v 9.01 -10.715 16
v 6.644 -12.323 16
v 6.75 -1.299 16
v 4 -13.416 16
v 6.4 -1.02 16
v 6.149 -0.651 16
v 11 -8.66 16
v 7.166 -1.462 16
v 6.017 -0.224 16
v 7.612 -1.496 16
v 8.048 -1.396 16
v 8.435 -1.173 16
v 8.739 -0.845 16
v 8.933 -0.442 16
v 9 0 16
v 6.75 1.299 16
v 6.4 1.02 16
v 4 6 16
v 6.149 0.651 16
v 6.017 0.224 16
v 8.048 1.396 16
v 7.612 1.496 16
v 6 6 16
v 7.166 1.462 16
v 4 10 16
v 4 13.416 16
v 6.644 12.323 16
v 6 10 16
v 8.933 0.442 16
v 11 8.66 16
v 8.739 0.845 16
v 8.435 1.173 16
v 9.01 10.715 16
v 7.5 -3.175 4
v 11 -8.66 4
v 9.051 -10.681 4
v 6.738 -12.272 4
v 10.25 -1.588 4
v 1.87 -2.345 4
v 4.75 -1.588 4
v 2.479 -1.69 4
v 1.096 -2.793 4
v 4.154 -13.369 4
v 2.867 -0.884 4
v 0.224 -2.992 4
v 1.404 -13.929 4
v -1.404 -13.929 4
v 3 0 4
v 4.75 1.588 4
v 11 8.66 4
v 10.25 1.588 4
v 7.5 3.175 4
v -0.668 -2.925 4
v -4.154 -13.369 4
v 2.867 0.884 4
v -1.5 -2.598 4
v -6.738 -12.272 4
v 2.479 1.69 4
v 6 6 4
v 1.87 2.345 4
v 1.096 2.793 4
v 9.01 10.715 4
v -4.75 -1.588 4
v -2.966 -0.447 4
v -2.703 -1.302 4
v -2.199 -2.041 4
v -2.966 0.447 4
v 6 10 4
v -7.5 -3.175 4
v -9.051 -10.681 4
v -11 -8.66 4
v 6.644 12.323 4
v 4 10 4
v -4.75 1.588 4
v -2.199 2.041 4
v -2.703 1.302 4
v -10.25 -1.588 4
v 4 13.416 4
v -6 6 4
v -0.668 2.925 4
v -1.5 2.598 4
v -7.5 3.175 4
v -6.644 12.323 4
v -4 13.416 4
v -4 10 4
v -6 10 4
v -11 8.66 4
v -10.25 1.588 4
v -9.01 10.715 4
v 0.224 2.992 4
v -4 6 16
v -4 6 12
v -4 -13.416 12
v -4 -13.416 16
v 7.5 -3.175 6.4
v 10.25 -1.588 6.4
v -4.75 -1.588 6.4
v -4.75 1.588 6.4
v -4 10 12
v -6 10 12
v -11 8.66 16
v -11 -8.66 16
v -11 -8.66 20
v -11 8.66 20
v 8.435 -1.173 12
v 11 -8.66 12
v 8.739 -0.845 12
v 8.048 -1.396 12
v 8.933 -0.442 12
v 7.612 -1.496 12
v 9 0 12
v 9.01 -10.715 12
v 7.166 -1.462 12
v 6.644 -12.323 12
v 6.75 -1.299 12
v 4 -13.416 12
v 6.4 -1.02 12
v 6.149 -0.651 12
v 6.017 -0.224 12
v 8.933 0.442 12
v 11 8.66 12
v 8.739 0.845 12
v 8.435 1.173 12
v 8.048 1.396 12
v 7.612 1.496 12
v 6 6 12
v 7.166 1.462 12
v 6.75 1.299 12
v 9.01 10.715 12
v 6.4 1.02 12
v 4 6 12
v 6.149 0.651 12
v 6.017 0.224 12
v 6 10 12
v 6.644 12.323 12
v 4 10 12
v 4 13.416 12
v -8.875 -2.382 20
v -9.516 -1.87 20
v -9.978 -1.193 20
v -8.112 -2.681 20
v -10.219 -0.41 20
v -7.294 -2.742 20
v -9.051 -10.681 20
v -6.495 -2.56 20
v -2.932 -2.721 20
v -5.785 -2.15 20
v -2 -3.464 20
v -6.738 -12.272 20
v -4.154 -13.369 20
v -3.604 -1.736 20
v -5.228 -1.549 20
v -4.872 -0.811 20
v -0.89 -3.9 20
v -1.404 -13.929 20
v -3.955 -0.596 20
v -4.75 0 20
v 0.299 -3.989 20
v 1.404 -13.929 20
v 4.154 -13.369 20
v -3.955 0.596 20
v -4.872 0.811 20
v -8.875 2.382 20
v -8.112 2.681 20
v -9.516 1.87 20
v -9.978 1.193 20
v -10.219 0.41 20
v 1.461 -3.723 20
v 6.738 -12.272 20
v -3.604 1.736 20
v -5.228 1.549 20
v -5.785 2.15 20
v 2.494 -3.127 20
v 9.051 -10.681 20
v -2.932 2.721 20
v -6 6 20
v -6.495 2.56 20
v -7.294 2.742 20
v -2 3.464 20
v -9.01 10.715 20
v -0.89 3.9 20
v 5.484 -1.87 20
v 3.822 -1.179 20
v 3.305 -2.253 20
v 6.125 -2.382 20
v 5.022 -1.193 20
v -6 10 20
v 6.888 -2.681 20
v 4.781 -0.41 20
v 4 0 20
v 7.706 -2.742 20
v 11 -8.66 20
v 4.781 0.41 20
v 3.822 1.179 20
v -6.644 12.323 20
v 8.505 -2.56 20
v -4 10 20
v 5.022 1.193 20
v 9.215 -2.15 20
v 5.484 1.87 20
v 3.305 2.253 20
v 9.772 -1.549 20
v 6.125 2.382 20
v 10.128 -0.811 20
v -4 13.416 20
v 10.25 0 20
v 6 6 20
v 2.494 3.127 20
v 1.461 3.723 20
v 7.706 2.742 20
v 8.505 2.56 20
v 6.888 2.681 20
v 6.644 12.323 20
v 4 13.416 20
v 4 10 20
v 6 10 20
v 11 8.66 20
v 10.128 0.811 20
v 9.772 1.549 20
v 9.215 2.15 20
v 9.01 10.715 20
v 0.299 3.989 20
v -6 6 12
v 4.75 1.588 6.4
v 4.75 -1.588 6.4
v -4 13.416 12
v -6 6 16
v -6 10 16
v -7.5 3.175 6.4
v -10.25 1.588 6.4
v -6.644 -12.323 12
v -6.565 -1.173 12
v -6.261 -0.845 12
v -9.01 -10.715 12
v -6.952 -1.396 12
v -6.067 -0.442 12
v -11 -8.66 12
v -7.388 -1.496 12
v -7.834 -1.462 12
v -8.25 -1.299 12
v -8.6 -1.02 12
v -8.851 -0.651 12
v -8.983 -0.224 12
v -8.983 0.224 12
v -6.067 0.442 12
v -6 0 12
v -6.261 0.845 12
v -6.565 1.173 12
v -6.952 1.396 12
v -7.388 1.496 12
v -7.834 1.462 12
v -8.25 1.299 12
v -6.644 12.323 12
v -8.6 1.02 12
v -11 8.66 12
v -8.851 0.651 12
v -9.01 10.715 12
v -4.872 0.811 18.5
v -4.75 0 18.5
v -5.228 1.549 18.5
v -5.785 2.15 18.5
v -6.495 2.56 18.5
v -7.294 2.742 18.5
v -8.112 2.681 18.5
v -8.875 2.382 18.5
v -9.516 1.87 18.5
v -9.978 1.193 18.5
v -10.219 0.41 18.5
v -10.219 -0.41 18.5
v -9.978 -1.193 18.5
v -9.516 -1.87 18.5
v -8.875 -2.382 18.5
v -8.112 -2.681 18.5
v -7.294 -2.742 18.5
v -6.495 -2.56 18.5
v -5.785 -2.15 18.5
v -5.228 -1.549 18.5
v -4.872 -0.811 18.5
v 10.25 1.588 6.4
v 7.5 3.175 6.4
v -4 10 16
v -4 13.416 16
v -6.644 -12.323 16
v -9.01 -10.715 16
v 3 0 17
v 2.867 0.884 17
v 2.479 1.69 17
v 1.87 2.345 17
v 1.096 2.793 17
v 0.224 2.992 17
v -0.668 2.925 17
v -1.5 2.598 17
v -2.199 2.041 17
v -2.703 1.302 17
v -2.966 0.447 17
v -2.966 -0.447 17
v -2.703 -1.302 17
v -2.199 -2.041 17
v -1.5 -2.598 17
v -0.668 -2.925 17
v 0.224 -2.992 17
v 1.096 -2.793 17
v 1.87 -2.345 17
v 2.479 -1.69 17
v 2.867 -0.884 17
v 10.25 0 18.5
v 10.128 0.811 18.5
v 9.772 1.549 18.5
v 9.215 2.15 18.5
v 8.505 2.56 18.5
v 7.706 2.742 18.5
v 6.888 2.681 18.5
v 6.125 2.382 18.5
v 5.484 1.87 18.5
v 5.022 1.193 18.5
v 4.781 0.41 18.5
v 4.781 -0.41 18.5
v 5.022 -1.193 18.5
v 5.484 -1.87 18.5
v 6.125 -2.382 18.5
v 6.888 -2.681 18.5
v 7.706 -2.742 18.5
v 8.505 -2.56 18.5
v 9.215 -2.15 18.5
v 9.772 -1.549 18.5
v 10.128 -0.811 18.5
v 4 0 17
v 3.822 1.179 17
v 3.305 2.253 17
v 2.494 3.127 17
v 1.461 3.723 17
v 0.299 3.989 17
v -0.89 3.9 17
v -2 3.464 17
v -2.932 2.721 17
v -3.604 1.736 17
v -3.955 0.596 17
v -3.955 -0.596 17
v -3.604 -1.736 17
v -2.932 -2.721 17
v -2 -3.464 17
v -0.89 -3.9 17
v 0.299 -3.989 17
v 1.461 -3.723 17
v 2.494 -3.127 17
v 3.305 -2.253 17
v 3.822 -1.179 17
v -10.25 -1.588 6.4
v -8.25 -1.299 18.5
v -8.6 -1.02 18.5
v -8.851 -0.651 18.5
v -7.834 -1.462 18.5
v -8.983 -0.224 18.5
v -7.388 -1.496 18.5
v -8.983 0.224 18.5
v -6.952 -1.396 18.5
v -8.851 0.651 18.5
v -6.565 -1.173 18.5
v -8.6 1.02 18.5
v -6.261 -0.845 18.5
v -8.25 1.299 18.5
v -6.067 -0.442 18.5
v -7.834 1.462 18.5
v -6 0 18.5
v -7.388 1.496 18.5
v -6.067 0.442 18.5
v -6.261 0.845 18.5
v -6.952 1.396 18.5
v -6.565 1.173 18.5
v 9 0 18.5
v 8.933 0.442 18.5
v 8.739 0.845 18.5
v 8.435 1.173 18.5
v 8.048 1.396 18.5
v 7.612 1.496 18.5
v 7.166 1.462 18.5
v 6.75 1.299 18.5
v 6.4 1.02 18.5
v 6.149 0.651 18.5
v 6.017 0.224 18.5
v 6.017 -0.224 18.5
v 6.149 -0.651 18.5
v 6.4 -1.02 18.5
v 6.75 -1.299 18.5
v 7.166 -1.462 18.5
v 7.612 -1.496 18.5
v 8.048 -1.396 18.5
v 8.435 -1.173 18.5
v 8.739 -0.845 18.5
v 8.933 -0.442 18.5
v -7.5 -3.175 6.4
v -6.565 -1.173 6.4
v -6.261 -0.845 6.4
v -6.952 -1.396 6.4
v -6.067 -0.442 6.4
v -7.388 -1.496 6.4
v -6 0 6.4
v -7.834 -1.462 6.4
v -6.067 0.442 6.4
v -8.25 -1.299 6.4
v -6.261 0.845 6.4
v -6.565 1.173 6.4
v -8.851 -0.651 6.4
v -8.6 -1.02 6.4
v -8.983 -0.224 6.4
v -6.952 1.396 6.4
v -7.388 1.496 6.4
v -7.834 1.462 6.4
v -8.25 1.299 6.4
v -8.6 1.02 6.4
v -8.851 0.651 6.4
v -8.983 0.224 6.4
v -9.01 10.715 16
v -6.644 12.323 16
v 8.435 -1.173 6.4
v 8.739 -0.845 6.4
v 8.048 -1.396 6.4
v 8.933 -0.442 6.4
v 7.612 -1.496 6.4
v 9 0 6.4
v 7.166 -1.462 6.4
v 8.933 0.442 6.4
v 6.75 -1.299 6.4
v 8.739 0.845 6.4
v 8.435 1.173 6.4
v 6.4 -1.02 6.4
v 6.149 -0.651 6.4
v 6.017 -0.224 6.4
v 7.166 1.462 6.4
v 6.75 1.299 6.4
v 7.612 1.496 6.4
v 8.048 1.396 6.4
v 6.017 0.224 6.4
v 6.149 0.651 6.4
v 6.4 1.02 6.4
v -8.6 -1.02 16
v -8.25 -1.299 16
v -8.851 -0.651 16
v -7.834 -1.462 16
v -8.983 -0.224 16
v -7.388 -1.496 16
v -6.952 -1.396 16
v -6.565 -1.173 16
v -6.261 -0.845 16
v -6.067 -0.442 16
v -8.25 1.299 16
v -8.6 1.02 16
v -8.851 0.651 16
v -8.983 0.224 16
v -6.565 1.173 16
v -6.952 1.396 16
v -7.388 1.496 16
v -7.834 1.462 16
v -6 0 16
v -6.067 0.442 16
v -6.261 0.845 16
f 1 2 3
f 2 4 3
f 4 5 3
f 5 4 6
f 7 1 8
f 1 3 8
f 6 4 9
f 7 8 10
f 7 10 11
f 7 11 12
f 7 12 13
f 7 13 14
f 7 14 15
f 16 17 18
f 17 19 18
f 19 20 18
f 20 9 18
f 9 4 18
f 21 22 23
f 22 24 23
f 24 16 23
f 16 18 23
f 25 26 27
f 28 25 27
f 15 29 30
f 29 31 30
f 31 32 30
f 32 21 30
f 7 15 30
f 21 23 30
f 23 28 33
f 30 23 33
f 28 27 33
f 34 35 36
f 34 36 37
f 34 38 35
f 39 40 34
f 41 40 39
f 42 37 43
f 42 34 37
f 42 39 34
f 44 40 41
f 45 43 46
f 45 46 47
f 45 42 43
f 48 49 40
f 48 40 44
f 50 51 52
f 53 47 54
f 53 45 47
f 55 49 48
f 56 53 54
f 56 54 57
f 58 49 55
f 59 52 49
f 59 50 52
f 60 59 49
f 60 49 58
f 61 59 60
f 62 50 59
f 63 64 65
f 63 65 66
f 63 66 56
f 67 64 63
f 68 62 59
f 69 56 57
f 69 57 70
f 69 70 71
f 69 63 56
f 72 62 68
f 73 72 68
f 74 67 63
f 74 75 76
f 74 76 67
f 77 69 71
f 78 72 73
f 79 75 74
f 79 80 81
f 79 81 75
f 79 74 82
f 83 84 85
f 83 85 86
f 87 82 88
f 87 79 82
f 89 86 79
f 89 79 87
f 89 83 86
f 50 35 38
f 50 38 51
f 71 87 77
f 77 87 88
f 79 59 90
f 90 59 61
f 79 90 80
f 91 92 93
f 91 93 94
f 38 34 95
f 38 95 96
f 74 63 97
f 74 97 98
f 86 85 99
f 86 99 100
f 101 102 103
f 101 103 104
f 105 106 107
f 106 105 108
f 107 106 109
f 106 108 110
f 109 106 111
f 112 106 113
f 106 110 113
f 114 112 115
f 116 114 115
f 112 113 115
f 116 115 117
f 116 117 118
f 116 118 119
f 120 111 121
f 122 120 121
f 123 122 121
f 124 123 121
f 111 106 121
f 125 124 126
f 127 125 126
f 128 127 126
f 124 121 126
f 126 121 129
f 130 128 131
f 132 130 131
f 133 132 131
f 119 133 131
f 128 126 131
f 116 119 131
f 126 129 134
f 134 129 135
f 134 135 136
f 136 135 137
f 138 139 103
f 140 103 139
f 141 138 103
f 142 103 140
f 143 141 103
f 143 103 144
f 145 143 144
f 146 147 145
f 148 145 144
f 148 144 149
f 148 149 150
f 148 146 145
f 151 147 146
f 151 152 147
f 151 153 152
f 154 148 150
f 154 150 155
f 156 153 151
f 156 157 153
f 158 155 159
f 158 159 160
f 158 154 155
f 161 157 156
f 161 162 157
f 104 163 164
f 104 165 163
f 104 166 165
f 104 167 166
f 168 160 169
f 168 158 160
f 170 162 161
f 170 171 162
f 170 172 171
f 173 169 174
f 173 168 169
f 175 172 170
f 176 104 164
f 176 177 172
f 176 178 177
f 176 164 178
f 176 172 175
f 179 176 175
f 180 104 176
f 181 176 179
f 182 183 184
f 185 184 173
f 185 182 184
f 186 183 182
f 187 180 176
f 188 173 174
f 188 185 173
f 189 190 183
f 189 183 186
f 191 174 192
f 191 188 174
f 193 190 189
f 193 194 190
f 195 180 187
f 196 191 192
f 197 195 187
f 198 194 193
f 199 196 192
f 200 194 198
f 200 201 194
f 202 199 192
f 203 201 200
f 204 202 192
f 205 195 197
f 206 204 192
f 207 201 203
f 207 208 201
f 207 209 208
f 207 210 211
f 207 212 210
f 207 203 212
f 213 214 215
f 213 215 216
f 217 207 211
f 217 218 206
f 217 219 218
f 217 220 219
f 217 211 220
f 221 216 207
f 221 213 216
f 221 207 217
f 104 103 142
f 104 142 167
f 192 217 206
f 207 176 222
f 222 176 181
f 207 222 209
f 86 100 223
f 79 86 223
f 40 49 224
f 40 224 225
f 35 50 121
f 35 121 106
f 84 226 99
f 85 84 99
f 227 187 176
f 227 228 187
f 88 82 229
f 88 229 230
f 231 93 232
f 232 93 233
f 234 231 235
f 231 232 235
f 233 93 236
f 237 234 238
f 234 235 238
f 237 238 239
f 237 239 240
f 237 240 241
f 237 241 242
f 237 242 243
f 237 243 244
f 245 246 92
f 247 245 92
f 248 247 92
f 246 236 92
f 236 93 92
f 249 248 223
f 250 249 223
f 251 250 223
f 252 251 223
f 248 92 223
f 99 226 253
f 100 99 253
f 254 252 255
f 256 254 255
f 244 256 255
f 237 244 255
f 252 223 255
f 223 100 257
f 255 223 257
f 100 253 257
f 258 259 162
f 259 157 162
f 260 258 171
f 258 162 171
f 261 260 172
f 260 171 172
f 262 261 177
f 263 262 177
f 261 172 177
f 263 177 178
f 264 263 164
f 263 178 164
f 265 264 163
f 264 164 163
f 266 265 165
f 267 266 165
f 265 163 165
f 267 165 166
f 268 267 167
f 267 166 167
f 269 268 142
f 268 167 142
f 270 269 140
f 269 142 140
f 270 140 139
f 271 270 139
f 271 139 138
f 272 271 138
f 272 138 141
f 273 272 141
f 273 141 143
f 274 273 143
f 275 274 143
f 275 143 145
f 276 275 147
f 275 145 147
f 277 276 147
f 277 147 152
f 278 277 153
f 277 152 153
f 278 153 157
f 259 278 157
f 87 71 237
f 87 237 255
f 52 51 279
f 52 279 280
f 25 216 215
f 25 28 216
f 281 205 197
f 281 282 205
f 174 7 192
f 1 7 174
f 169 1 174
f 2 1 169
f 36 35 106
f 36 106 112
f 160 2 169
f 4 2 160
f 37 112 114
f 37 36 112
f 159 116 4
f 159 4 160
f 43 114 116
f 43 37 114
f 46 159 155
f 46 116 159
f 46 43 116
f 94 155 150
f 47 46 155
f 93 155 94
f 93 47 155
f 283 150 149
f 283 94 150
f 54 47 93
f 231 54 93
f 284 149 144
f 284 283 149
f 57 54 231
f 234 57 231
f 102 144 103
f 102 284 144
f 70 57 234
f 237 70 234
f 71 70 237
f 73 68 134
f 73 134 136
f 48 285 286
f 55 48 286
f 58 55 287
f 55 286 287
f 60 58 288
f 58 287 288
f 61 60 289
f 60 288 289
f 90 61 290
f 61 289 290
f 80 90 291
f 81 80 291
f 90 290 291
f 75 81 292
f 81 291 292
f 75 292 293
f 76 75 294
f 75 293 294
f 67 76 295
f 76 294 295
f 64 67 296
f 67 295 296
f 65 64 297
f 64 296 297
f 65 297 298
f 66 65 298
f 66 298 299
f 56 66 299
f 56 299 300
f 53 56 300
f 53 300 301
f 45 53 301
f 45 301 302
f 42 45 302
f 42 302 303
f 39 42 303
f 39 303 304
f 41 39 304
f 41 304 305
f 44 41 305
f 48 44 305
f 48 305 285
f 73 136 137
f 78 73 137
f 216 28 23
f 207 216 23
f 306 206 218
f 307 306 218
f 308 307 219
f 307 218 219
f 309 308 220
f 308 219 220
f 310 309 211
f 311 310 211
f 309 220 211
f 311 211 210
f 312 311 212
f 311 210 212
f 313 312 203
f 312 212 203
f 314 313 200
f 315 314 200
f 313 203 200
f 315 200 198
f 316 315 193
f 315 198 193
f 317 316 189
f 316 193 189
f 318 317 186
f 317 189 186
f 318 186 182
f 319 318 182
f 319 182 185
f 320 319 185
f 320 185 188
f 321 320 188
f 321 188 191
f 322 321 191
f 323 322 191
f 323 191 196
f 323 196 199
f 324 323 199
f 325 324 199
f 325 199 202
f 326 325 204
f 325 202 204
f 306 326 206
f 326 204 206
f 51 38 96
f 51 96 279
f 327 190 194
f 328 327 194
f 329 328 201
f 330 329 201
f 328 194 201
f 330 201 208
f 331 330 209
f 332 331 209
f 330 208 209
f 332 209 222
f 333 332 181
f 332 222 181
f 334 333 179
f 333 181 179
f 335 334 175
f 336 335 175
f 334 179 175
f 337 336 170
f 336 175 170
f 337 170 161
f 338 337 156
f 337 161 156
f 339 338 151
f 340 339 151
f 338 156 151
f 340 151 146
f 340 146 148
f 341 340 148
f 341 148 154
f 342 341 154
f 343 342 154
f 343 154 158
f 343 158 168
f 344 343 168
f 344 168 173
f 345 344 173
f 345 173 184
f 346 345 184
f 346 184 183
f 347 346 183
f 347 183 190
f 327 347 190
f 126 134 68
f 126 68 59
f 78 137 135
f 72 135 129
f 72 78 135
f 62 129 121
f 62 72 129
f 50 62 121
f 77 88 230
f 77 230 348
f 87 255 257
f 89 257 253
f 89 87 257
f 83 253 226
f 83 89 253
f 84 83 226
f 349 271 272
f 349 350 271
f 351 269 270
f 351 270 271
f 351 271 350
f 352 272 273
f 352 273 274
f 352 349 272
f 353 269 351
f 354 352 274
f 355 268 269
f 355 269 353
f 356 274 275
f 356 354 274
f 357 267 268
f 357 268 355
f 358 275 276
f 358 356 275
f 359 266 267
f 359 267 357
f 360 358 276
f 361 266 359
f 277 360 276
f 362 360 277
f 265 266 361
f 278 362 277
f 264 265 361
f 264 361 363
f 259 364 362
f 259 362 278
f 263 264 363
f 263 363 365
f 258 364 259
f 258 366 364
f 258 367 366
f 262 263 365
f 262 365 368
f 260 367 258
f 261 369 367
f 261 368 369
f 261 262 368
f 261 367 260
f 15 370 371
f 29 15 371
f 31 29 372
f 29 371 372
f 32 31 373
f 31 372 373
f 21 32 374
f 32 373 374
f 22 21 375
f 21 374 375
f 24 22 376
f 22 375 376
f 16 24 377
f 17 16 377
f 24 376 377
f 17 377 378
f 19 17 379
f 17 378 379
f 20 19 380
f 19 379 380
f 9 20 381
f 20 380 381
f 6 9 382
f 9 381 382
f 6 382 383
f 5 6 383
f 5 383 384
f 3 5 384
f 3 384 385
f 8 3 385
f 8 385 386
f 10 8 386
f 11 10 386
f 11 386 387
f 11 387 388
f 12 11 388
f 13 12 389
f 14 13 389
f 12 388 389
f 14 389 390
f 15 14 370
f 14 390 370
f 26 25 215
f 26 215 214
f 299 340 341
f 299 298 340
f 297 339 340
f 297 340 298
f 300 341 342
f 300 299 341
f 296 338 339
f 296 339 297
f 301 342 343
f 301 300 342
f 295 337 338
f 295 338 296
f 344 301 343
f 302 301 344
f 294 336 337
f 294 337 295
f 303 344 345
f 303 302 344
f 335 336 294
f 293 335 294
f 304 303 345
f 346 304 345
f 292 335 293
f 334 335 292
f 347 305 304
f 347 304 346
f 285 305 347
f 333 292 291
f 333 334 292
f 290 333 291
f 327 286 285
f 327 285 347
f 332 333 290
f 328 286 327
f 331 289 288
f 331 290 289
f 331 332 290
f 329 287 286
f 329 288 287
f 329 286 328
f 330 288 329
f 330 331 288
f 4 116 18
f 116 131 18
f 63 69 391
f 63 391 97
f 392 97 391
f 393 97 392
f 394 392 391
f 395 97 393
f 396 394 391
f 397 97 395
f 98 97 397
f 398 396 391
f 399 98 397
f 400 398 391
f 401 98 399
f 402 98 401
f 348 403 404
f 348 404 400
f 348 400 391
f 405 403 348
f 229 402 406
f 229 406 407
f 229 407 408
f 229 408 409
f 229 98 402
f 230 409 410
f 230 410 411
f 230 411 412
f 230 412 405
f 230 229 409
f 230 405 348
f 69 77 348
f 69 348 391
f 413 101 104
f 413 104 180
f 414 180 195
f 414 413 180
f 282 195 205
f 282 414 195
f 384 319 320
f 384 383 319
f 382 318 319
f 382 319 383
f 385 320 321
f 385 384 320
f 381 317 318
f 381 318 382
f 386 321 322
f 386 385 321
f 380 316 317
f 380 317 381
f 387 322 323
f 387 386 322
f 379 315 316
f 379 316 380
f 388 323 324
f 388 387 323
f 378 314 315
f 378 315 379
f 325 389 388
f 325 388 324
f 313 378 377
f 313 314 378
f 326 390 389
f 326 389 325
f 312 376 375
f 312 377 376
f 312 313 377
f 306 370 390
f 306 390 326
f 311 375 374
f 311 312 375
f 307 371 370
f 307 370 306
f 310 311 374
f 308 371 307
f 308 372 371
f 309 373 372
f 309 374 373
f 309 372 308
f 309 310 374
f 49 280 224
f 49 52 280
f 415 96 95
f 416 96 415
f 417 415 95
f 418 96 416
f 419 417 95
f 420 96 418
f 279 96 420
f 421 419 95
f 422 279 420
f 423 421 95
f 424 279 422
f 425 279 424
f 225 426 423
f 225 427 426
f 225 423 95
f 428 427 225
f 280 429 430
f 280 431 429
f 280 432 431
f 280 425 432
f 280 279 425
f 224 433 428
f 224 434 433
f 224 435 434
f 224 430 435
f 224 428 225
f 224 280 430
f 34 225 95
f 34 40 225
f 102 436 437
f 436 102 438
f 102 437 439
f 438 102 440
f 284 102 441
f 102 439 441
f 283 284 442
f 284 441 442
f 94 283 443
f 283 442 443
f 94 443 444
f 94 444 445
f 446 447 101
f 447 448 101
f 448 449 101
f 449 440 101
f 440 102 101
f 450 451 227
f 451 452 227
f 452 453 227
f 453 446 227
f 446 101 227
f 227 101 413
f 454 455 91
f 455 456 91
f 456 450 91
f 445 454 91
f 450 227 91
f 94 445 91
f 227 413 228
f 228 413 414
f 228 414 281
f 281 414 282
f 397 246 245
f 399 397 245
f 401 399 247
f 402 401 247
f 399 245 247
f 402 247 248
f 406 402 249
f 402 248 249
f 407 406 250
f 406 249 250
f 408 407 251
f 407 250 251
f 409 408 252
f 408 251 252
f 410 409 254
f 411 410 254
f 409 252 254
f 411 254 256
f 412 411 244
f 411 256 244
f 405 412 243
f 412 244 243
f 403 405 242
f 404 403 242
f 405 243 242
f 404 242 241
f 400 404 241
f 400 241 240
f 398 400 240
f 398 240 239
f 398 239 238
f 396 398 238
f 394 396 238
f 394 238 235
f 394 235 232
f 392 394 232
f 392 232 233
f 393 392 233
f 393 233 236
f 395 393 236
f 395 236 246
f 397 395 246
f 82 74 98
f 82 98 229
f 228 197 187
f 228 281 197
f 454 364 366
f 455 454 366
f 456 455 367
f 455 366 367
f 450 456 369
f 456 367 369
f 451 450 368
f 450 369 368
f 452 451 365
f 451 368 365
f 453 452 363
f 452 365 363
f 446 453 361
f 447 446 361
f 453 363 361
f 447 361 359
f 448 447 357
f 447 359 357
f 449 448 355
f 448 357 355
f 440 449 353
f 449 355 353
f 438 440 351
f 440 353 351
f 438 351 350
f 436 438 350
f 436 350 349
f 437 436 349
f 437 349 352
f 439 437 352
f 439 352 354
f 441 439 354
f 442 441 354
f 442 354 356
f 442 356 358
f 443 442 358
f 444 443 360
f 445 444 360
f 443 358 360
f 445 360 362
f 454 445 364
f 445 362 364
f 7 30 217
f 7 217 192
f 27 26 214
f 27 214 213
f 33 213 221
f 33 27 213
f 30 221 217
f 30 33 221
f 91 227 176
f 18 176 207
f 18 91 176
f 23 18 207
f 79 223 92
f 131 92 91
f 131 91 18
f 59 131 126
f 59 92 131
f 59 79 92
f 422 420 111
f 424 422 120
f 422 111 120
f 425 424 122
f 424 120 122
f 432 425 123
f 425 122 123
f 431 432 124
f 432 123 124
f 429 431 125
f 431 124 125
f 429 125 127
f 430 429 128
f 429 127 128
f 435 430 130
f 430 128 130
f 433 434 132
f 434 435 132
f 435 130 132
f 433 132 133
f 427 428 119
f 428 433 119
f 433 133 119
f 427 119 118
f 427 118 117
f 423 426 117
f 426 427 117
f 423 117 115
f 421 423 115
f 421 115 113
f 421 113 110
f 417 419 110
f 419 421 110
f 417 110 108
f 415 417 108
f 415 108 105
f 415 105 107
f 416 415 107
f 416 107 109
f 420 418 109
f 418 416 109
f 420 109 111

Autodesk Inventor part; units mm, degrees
ref_plane "YZ Plane" through (0, 0, 0) normal (1, 0, 0) x (0, 1, 0)
ref_plane "XZ Plane" through (0, 0, 0) normal (0, 1, 0) x (-1, 0, 0)
sketch "Náčrt1" plane through (0, 0, 0) normal (0, 0, 1) x (1, 0, 0)
  line L0 (11, 8.6603) -> (11, -8.6603)
  line L1 (-11, -8.6603) -> (-11, 8.6603)
  arc A0 (-11, -8.6603) -> (11, -8.6603) centre (0, 0) ccw
  line L2 (-4, 13.4164) -> (-4, 10)
  line L3 (-4, 10) -> (-6, 10)
  line L4 (-6, 6) -> (6, 6)
  line L5 (6, 10) -> (4, 10)
  line L6 (4, 10) -> (4, 13.4164)
  line L7 (-6, 10) -> (-6, 6)
  line L8 (6, 10) -> (6, 6)
  arc A1 (11, 8.6603) -> (4, 13.4164) centre (0, 0) ccw
  arc A2 (-4, 13.4164) -> (-11, 8.6603) centre (0, 0) ccw
  dimension "d26" = 22
  dimension "attachmentRadius" = 14
  dimension "d28" = 14
  dimension "d29" = 14
extrude "Vysunutí1" add sketch "Náčrt1" along normal blind 20
ref_plane "Pracovní rovina1" through (0, 14, 0) normal (0, 1, 0) x (-1, 0, 0)
sketch "Náčrt2" plane through (0, 14, 0) normal (0, 1, 0) x (-1, 0, 0)
  line L0 (11, 0) -> (11, 20) projected
  line L1 (4, 0) -> (4, 20) projected
  line L2 (11, 16) -> (4, 16)
  line L3 (4, 16) -> (4, 12)
  line L4 (4, 12) -> (11, 12)
  line L5 (11, 12) -> (11, 16)
  line L6 (-4, 0) -> (-4, 20) projected
  line L7 (-11, 0) -> (-11, 20) projected
  line L8 (-4, 16) -> (-11, 16)
  line L9 (-11, 16) -> (-11, 12)
  line L10 (-11, 12) -> (-4, 12)
  line L11 (-4, 12) -> (-4, 16)
  point P0 (0, 0)
extrude "Vysunutí2" cut sketch "Náčrt2" against normal up to next
sketch "Náčrt6" plane through (0, 0, 20) normal (0, 0, 1) x (1, 0, 0)
  circle A0 centre (7.5, 0) radius 1.5
  circle A1 centre (-7.5, 0) radius 1.5
  line L0 (11, -8.6603) -> (11, 8.6603) projected
  line L1 (-11, 8.6603) -> (-11, -8.6603) projected
  arc A2 (11, 8.6603) -> (4, 13.4164) centre (0, 0) ccw projected
  dimension "d15" = 3.5
  dimension "attachmentHoleOffset" = 3.5
  dimension "d17" = 3
  dimension "attachmentHoleDia" = 3
extrude "Vysunutí6" cut sketch "Náčrt6" against normal up to surface (20 mm away)
sketch "Náčrt8" plane through (0, 0, 0) normal (0, 0, -1) x (-1, 0, 0)
  circle A0 centre (-7.5, 0) radius 1.5 projected
  circle A1 centre (7.5, 0) radius 1.5 projected
  line L0 (-11, 8.6603) -> (-11, -8.6603) projected
  arc A2 (-11, -8.6603) -> (11, -8.6603) centre (0, 0) ccw projected
  line L1 (11, -8.6603) -> (11, 8.6603) projected
  arc A3 (11, 8.6603) -> (4, 13.4164) centre (0, 0) ccw projected
  line L2 (4, 13.4164) -> (4, 10) projected
  line L3 (4, 10) -> (6, 10) projected
  line L4 (6, 10) -> (6, 6) projected
  line L5 (6, 6) -> (-6, 6) projected
  line L6 (-6, 6) -> (-6, 10) projected
  line L7 (-6, 10) -> (-4, 10) projected
  line L8 (-4, 10) -> (-4, 13.4164) projected
  arc A4 (-4, 13.4164) -> (-11, 8.6603) centre (0, 0) ccw projected
extrude "Vysunutí8" cut sketch "Náčrt8" against normal blind 4
sketch "Náčrt9" plane through (0, 0, 20) normal (0, 0, 1) x (1, 0, 0)
  arc A0 (-4, 13.4164) -> (-11, 8.6603) centre (0, 0) ccw projected
  circle A1 centre (0, 0) radius 3
extrude "Vysunutí9" cut sketch "Náčrt9" against normal up to next
sketch "Náčrt10" plane through (0, 0, 20) normal (0, 0, 1) x (1, 0, 0)
  circle A0 centre (0, 0) radius 3 projected
  arc A1 (-11, -8.6603) -> (11, -8.6603) centre (0, 0) ccw projected
  circle A2 centre (0, 0) radius 4
  dimension "d23" = 8
extrude "Vysunutí10" cut sketch "Náčrt10" against normal blind 3
sketch "Náčrt11" plane through (0, 0, 20) normal (0, 0, 1) x (1, 0, 0)
  circle A0 centre (7.5, 0) radius 1.5 projected
  circle A1 centre (-7.5, 0) radius 1.5 projected
  circle A2 centre (-7.5, 0) radius 1.5 projected
  circle A3 centre (-7.5, 0) radius 2.75
  circle A4 centre (7.5, 0) radius 1.5 projected
  circle A5 centre (7.5, 0) radius 2.75
  dimension "d30" = 5.5
  dimension "d31" = 5.5
extrude "Vysunutí11" cut sketch "Náčrt11" against normal blind 1.5
sketch "Náčrt12" plane through (0, 0, 4) normal (0, 0, -1) x (-1, 0, 0)
  line L0 (7.5, 3.1754) -> (10.25, 1.5877)
  line L1 (10.25, 1.5877) -> (10.25, -1.5877)
  line L2 (10.25, -1.5877) -> (7.5, -3.1754)
  line L3 (7.5, -3.1754) -> (4.75, -1.5877)
  line L4 (4.75, -1.5877) -> (4.75, 1.5877)
  line L5 (4.75, 1.5877) -> (7.5, 3.1754)
  line L6 (-11, -8.6603) -> (-11, 8.6603)
  circle A0 centre (-7.5, 0) radius 1.5 projected
  line L7 (-7.5, 3.1754) -> (-4.75, 1.5877)
  line L8 (-4.75, 1.5877) -> (-4.75, -1.5877)
  line L9 (-4.75, -1.5877) -> (-7.5, -3.1754)
  line L10 (-7.5, -3.1754) -> (-10.25, -1.5877)
  line L11 (-10.25, -1.5877) -> (-10.25, 1.5877)
  line L12 (-10.25, 1.5877) -> (-7.5, 3.1754)
  point P0 (7.5, 0)
  point P1 (7.5, 0)
  dimension "d38" = 5.5
extrude "Vysunutí13" cut sketch "Náčrt12" against normal blind 2.4
equation "\"d28\" = attachmentRadius"
equation "\"d29\" = attachmentRadius"
equation "\"d15\" = attachmentHoleOffset"
equation "\"d17\" = attachmentHoleDia"
properties part number "attachment"
